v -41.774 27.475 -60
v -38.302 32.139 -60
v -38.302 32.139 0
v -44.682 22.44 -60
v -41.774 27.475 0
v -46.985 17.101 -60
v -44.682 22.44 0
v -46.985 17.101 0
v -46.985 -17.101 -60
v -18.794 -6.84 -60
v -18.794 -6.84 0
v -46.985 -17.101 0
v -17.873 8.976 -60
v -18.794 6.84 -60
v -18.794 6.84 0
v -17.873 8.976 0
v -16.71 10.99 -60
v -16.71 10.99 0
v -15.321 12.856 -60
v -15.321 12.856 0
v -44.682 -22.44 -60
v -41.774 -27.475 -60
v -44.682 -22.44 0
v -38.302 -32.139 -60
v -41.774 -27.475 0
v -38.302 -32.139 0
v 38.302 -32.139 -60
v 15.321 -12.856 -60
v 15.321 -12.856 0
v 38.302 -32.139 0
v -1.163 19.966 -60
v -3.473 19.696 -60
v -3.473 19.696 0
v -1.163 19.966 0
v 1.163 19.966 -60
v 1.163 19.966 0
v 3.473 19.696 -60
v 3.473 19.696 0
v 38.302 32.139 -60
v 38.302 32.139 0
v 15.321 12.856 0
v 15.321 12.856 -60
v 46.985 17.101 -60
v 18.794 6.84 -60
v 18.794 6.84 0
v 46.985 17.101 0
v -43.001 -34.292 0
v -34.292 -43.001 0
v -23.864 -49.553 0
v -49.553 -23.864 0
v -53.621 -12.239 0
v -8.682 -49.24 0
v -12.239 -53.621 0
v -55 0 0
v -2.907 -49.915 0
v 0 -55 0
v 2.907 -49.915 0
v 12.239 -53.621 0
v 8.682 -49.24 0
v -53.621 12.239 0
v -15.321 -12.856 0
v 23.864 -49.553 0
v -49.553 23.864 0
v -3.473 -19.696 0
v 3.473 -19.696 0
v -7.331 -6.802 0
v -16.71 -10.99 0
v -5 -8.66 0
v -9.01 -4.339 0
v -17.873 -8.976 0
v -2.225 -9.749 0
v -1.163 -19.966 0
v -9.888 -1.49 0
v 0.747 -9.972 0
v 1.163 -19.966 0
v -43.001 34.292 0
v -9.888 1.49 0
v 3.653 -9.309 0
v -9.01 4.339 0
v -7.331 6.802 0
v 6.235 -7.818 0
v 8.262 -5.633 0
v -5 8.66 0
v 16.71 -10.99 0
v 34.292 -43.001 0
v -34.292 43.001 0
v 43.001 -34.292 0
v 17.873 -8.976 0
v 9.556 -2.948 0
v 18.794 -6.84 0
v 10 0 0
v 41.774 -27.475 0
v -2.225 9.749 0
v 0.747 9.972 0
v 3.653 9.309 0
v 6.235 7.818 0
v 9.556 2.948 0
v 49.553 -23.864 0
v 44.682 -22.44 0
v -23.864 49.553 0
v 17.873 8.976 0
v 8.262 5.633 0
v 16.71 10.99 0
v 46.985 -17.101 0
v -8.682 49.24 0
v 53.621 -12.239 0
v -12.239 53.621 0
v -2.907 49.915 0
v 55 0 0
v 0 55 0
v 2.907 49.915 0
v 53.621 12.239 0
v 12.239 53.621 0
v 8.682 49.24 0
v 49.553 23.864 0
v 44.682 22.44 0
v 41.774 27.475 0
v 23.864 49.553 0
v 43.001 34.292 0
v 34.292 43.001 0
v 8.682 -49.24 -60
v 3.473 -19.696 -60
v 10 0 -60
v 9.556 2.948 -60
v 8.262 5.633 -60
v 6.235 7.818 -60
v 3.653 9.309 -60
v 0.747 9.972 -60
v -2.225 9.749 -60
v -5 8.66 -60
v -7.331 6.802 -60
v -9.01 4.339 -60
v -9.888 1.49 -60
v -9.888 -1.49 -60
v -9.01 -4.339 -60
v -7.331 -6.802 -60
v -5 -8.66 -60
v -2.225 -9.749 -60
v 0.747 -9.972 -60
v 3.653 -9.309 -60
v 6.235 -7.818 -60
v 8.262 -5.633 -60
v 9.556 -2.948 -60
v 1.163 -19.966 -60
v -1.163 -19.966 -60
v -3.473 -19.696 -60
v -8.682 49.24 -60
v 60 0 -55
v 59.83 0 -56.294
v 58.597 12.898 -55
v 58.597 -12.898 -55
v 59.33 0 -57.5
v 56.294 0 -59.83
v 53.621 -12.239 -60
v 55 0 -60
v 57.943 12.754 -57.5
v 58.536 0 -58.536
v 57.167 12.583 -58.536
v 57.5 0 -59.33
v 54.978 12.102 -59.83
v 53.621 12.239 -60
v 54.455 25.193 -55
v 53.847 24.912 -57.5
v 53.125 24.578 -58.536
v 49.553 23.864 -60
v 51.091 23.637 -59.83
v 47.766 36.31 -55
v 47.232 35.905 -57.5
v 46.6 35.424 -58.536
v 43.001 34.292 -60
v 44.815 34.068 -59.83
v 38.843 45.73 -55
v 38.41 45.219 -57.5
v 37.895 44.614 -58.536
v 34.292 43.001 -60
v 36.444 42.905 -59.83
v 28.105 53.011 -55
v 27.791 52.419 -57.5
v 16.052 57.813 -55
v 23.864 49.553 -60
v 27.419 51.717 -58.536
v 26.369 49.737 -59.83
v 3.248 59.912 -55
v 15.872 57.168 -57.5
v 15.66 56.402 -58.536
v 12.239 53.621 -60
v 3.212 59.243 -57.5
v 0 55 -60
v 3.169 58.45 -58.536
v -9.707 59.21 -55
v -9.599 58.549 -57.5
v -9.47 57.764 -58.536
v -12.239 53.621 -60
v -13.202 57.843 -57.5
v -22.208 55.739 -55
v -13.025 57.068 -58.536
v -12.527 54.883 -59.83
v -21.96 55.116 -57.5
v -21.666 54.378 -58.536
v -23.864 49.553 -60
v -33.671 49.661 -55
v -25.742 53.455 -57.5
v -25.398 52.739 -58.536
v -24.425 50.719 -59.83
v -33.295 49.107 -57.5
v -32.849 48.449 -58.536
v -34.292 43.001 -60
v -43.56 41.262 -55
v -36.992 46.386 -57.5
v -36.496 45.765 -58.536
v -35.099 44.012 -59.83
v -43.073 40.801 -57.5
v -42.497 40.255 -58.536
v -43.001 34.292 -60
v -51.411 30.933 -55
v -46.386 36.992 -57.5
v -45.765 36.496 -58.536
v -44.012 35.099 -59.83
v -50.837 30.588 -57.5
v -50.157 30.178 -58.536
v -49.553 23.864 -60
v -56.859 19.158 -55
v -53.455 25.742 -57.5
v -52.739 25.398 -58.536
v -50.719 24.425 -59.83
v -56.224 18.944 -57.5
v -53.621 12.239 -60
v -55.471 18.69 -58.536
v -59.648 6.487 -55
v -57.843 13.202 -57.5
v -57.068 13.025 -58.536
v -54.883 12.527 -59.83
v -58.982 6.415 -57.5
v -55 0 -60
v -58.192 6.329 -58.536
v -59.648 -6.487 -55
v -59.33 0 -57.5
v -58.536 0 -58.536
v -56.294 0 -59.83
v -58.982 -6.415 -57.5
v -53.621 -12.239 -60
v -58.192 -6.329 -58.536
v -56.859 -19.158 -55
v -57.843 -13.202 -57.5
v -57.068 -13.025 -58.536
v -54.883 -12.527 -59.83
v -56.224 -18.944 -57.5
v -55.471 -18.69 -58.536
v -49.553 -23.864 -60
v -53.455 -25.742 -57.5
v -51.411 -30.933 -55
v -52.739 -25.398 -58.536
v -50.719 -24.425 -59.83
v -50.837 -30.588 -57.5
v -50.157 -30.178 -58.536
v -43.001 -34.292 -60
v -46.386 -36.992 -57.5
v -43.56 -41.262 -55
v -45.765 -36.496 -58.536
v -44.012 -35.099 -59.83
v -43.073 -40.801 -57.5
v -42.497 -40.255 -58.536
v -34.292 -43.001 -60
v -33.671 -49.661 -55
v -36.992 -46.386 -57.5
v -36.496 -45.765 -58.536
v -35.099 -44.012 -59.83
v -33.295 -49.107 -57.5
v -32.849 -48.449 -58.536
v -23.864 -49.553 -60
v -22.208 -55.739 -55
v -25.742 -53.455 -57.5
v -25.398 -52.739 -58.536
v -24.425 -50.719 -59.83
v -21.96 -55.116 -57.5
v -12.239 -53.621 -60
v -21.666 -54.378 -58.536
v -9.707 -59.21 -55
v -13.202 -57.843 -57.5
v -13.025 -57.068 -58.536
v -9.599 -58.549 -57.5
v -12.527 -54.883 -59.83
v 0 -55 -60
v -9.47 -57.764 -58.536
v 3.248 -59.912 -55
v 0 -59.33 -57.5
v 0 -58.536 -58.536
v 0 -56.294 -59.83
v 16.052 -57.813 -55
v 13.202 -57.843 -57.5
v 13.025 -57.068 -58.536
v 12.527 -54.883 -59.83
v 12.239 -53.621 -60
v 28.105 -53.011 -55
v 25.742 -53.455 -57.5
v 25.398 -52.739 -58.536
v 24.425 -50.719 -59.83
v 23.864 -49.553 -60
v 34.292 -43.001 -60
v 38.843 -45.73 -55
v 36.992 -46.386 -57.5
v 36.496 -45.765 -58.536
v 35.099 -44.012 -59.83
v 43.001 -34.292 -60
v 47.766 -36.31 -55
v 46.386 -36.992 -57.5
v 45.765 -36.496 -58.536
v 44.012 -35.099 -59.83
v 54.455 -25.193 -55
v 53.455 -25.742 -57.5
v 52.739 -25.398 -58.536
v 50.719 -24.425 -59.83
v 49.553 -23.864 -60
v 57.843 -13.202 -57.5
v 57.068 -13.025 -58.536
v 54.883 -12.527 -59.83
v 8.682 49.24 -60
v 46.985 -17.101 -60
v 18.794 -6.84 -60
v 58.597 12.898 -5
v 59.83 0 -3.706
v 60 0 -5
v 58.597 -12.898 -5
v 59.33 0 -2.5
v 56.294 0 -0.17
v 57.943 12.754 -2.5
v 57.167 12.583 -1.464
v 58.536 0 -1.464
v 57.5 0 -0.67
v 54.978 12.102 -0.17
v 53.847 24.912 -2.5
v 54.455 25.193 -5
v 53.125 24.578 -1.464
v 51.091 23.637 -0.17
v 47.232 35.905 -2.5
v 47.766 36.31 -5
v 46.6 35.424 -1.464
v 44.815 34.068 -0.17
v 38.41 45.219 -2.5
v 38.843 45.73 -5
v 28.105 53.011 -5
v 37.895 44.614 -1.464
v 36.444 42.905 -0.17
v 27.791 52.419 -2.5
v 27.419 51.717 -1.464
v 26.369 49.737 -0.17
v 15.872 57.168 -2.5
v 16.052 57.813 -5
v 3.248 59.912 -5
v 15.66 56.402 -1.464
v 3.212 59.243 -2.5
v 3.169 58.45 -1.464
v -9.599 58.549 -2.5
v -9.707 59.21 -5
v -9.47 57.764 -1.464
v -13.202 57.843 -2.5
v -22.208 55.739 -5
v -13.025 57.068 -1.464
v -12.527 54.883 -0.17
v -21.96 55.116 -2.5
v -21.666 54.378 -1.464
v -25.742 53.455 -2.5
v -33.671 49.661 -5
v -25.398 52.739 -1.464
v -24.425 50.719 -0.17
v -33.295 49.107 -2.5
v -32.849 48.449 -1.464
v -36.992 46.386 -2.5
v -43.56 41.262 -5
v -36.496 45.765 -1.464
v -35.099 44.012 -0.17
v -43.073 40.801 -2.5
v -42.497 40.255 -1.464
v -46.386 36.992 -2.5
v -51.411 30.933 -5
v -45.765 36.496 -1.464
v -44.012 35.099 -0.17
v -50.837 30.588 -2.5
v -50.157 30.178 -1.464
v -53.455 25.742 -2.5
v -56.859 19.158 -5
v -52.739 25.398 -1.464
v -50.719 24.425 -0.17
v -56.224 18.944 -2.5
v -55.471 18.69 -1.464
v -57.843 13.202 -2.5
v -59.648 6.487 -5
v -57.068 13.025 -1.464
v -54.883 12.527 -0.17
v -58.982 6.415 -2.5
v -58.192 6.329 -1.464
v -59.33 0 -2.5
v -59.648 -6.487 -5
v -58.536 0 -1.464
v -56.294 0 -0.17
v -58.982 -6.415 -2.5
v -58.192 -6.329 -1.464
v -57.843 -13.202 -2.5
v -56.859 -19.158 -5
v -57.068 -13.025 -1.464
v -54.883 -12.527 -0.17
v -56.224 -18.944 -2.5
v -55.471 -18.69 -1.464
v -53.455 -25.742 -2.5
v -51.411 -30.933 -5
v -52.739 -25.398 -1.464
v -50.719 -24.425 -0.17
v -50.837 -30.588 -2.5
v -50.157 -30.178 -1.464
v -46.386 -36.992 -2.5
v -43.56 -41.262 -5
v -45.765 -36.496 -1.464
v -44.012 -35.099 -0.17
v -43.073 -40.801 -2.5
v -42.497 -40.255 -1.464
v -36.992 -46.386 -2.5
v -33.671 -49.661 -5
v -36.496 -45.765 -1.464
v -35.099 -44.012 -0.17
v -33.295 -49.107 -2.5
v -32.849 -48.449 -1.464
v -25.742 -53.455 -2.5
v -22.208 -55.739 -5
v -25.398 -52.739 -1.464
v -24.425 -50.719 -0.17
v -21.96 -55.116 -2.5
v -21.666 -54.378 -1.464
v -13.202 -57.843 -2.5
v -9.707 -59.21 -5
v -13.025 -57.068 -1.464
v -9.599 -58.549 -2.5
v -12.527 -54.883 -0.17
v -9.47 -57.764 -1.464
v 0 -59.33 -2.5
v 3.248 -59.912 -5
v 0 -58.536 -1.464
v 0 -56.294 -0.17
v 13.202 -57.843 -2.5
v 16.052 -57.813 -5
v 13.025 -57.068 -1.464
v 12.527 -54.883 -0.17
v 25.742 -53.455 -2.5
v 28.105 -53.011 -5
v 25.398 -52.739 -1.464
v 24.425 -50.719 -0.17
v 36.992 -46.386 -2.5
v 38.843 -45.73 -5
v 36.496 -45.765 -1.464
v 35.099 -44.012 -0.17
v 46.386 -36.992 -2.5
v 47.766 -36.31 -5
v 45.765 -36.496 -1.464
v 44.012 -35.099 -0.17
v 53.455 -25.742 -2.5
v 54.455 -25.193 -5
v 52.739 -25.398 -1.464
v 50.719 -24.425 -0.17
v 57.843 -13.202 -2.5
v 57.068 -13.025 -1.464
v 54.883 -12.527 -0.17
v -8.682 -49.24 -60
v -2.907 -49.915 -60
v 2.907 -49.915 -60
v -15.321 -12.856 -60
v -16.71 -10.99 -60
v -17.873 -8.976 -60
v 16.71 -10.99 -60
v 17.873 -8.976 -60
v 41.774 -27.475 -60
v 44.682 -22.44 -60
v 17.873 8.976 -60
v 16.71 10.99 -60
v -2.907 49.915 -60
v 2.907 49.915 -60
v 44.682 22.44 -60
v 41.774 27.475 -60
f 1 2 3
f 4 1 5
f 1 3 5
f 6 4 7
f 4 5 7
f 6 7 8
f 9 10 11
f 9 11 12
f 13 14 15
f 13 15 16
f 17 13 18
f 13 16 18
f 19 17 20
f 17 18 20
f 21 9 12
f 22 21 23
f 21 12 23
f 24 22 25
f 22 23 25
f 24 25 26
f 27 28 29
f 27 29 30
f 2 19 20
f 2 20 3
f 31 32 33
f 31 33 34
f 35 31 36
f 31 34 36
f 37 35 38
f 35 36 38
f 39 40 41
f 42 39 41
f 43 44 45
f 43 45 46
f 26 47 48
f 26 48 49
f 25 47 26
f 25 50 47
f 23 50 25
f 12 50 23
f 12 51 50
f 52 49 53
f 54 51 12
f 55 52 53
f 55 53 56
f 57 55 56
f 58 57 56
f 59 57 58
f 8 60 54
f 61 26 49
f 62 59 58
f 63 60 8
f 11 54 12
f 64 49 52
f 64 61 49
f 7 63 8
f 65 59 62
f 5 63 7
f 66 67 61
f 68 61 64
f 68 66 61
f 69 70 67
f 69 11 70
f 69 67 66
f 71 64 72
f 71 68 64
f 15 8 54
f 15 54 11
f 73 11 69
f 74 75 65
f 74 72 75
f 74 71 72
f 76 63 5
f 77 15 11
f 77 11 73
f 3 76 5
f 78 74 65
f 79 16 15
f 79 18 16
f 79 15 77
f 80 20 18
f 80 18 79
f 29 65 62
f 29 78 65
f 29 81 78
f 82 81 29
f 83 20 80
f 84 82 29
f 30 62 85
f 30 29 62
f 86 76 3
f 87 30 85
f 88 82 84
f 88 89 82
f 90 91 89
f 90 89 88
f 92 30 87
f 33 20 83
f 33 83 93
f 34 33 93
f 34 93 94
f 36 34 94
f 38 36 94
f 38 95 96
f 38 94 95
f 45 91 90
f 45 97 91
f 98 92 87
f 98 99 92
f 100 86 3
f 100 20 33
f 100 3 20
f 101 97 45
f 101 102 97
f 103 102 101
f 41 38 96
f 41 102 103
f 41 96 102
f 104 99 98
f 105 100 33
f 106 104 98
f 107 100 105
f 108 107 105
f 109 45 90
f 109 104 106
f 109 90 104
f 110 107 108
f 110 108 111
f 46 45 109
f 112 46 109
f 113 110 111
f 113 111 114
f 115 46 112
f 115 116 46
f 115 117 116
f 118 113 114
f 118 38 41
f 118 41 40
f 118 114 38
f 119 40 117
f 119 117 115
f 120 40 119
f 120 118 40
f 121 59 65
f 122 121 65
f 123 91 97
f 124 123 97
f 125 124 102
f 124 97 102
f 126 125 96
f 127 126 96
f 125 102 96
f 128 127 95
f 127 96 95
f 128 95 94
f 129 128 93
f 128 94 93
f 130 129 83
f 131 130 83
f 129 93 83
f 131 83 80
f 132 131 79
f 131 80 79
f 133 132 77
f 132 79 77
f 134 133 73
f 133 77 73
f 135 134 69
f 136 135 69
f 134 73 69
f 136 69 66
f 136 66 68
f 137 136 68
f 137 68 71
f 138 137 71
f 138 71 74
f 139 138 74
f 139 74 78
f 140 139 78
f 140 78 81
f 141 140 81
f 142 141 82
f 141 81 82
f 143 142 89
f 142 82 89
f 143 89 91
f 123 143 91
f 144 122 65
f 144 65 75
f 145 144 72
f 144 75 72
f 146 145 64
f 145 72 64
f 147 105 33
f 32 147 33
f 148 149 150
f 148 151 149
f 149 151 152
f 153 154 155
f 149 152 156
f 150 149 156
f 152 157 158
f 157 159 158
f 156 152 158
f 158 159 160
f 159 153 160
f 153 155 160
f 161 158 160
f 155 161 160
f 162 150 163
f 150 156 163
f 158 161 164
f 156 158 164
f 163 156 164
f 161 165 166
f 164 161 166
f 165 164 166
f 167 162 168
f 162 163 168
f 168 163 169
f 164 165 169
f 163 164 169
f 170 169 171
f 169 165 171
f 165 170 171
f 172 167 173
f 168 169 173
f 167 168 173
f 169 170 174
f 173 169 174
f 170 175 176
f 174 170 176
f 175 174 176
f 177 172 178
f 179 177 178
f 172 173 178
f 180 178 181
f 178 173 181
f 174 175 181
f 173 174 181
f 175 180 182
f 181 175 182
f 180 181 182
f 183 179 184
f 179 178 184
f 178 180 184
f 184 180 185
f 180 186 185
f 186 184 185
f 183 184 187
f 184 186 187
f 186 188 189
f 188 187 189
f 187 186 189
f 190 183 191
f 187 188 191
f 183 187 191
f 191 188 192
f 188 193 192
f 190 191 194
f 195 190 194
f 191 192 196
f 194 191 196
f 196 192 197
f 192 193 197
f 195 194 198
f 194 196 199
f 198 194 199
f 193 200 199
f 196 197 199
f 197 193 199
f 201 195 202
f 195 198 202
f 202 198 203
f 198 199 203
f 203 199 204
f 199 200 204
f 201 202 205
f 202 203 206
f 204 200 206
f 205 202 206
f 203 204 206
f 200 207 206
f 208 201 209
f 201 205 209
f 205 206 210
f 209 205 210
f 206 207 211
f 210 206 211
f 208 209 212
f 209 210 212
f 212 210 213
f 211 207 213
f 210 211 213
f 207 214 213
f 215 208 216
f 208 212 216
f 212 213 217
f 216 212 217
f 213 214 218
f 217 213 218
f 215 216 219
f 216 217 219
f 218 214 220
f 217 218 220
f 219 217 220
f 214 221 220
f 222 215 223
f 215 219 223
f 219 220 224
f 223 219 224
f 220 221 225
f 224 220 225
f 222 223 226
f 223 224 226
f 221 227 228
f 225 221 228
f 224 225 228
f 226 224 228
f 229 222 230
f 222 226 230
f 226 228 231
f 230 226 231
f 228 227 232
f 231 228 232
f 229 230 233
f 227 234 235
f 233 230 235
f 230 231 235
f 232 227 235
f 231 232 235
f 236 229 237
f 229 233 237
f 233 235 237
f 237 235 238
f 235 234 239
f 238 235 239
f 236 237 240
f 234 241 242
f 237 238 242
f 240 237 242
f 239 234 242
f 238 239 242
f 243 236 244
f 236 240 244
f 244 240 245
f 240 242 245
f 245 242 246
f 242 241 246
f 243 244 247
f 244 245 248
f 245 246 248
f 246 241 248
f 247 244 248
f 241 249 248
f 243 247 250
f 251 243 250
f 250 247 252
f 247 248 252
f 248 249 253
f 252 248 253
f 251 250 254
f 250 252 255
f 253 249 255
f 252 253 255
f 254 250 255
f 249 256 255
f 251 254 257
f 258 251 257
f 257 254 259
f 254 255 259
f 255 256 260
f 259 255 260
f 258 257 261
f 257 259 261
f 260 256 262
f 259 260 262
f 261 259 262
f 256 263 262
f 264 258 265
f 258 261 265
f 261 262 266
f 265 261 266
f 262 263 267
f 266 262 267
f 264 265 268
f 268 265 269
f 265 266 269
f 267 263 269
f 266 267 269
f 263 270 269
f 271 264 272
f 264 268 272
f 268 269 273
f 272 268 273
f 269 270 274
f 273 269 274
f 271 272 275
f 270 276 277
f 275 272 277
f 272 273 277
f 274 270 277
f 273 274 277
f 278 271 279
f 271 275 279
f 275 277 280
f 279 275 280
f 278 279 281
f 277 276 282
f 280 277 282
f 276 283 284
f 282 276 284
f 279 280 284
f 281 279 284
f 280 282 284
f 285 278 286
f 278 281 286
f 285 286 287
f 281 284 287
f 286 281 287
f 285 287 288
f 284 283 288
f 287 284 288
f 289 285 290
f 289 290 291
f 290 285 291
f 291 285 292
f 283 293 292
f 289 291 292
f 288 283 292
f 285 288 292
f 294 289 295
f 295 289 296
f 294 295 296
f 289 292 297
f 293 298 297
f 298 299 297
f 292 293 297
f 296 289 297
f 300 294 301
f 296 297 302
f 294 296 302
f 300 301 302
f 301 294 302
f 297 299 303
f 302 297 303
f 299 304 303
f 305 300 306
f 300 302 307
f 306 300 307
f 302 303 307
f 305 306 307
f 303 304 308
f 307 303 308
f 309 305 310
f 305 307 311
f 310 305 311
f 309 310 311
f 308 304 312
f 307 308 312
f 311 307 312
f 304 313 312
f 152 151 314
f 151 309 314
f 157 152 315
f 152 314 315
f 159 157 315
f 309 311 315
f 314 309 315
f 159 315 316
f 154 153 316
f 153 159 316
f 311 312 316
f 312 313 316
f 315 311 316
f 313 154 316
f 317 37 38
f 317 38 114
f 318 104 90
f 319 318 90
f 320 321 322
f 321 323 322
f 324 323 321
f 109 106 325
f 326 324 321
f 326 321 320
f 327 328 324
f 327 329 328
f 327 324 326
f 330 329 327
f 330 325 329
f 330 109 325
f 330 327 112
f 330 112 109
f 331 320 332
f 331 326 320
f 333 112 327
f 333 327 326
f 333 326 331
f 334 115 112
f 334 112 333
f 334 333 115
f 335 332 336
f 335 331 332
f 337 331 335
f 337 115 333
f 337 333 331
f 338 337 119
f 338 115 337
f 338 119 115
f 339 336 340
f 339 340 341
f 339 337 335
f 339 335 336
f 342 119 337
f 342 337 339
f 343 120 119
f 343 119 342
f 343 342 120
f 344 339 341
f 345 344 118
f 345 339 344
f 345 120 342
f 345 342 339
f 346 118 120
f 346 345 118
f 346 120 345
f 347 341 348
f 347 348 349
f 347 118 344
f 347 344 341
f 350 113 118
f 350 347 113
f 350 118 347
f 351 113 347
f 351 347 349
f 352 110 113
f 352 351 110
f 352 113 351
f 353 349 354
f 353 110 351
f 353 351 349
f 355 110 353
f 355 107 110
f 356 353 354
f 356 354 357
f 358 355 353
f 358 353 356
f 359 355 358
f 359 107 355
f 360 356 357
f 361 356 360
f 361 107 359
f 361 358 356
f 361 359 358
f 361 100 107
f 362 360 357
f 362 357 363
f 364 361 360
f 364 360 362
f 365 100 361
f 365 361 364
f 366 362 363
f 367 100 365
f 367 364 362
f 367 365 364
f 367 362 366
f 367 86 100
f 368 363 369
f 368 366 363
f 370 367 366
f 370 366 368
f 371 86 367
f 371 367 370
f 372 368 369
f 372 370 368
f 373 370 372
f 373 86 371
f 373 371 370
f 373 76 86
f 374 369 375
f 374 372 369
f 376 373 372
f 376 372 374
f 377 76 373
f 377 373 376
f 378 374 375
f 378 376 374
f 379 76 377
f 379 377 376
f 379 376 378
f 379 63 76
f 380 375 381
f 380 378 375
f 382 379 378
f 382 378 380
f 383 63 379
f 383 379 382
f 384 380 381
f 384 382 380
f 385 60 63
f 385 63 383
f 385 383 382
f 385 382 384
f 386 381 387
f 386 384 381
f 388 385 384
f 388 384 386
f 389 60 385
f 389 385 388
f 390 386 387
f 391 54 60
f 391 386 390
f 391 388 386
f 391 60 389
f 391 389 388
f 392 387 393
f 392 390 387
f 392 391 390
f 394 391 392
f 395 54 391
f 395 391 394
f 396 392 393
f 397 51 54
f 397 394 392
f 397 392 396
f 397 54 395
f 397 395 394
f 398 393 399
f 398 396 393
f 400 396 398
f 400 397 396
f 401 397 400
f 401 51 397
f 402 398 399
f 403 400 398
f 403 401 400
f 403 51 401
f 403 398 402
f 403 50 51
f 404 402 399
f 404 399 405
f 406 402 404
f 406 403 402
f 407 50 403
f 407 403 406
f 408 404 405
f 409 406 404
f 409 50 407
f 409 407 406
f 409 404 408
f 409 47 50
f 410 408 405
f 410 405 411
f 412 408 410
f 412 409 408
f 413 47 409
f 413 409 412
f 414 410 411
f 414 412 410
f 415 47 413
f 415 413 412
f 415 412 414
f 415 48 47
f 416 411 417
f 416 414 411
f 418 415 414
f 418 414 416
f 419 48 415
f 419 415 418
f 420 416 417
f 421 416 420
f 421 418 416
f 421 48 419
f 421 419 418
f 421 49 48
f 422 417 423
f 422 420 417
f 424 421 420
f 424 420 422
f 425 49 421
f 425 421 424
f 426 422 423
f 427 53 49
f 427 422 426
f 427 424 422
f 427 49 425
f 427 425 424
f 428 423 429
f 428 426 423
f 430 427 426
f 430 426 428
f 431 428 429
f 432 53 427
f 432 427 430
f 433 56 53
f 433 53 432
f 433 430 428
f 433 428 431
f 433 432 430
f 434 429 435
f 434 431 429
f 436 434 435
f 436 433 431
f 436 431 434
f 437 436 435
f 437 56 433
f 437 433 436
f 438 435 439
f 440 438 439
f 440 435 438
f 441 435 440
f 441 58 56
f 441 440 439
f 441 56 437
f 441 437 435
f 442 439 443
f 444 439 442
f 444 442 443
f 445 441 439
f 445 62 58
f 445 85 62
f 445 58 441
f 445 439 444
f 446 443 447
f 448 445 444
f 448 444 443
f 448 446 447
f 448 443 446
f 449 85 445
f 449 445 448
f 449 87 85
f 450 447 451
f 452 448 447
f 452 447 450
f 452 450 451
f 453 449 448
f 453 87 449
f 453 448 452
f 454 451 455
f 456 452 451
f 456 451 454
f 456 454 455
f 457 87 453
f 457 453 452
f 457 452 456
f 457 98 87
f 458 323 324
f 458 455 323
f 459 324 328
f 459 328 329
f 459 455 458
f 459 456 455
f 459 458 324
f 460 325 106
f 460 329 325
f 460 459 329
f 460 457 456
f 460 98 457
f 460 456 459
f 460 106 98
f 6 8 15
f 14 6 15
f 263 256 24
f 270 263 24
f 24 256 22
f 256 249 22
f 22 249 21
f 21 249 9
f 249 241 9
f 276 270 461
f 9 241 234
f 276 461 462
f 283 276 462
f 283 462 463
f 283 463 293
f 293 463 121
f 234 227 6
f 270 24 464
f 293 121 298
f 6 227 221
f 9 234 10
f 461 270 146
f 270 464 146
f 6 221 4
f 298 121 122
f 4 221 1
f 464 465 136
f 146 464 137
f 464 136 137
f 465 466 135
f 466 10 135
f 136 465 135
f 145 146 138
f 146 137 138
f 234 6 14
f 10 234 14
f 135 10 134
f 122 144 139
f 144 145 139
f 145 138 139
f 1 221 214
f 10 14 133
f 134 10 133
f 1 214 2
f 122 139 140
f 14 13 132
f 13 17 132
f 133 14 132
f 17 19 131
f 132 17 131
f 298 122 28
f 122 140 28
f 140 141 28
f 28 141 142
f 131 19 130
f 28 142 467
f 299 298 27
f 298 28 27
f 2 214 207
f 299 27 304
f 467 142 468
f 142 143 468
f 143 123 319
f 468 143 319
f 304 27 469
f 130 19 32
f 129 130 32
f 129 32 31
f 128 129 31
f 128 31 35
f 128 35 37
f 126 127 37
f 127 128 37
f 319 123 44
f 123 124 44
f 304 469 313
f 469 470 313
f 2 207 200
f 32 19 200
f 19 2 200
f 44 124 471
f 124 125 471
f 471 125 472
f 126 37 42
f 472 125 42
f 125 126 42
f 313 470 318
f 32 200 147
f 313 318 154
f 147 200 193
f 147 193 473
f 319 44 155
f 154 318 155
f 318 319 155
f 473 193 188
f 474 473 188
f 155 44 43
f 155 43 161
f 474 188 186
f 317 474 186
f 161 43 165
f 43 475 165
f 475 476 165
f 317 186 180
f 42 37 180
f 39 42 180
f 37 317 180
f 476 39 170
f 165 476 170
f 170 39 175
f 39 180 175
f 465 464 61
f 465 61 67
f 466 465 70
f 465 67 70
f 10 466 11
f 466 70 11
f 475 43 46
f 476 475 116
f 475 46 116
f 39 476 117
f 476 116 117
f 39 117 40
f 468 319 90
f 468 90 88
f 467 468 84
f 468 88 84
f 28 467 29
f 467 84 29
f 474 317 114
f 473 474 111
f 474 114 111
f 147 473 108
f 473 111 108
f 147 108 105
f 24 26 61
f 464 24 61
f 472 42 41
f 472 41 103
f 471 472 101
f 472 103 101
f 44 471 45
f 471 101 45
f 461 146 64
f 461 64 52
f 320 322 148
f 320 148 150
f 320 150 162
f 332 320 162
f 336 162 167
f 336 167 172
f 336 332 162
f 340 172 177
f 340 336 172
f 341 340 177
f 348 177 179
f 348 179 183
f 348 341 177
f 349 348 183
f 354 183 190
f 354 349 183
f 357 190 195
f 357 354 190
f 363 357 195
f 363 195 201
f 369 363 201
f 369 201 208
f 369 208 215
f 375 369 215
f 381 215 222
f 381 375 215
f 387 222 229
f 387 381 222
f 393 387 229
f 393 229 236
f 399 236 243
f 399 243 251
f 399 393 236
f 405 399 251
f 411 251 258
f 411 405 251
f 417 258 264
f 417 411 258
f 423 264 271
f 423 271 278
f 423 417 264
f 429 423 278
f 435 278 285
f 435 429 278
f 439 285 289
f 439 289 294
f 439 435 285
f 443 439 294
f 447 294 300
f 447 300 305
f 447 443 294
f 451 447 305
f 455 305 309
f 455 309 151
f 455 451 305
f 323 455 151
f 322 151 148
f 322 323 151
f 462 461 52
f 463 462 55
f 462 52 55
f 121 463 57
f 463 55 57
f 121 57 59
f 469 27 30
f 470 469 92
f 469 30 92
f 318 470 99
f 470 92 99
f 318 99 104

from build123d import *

# Parameters (mm, degrees)
SKETCH_1_R               = 60
SKETCH_1_R_2             = 10
EXTRUDE_1_DEPTH          = 60
CUT_EXTRUDE_1_DEPTH      = 60
PATTERN_CIRCULAR_1_COUNT = 6
FILLET_1_R               = 5


with BuildPart() as part:
    # 草图1 → 凸台-拉伸1 (new body)
    with BuildSketch(Plane.XY):
        Circle(SKETCH_1_R)
        Circle(SKETCH_1_R_2, mode=Mode.SUBTRACT)
    extrude(amount=-EXTRUDE_1_DEPTH)

    # 草图2 → 切除-拉伸1 (cut)
    with BuildSketch(Plane.XY):
        with BuildLine():
            Line((-8.682408883, 49.240387651), (-3.472963553, 19.69615506))
            ThreePointArc((-3.472963553, 19.69615506), (0, 20), (3.472963553, 19.69615506))
            Line((3.472963553, 19.69615506), (8.682408883, 49.240387651))
            ThreePointArc((8.682408883, 49.240387651), (0, 50), (-8.682408883, 49.240387651))
        make_face()
    cut_extrude_1 = extrude(amount=-CUT_EXTRUDE_1_DEPTH, mode=Mode.SUBTRACT)

    # 阵列(圆周)1: 切除-拉伸1 ×6 about axis
    pattern_circular_1_axis = Axis((0, 0, -60), (0, 0, 1))
    for i in range(1, PATTERN_CIRCULAR_1_COUNT):
        add(cut_extrude_1.rotate(pattern_circular_1_axis, i * 360 / PATTERN_CIRCULAR_1_COUNT), mode=Mode.SUBTRACT)

    # 圆角1
    fillet_1_edges = [part.edges().sort_by_distance(p)[0] for p in [
        (-60, 0, -60),
        (-60, 0, 0),
    ]]
    fillet(fillet_1_edges, radius=FILLET_1_R)


solid = part.part
